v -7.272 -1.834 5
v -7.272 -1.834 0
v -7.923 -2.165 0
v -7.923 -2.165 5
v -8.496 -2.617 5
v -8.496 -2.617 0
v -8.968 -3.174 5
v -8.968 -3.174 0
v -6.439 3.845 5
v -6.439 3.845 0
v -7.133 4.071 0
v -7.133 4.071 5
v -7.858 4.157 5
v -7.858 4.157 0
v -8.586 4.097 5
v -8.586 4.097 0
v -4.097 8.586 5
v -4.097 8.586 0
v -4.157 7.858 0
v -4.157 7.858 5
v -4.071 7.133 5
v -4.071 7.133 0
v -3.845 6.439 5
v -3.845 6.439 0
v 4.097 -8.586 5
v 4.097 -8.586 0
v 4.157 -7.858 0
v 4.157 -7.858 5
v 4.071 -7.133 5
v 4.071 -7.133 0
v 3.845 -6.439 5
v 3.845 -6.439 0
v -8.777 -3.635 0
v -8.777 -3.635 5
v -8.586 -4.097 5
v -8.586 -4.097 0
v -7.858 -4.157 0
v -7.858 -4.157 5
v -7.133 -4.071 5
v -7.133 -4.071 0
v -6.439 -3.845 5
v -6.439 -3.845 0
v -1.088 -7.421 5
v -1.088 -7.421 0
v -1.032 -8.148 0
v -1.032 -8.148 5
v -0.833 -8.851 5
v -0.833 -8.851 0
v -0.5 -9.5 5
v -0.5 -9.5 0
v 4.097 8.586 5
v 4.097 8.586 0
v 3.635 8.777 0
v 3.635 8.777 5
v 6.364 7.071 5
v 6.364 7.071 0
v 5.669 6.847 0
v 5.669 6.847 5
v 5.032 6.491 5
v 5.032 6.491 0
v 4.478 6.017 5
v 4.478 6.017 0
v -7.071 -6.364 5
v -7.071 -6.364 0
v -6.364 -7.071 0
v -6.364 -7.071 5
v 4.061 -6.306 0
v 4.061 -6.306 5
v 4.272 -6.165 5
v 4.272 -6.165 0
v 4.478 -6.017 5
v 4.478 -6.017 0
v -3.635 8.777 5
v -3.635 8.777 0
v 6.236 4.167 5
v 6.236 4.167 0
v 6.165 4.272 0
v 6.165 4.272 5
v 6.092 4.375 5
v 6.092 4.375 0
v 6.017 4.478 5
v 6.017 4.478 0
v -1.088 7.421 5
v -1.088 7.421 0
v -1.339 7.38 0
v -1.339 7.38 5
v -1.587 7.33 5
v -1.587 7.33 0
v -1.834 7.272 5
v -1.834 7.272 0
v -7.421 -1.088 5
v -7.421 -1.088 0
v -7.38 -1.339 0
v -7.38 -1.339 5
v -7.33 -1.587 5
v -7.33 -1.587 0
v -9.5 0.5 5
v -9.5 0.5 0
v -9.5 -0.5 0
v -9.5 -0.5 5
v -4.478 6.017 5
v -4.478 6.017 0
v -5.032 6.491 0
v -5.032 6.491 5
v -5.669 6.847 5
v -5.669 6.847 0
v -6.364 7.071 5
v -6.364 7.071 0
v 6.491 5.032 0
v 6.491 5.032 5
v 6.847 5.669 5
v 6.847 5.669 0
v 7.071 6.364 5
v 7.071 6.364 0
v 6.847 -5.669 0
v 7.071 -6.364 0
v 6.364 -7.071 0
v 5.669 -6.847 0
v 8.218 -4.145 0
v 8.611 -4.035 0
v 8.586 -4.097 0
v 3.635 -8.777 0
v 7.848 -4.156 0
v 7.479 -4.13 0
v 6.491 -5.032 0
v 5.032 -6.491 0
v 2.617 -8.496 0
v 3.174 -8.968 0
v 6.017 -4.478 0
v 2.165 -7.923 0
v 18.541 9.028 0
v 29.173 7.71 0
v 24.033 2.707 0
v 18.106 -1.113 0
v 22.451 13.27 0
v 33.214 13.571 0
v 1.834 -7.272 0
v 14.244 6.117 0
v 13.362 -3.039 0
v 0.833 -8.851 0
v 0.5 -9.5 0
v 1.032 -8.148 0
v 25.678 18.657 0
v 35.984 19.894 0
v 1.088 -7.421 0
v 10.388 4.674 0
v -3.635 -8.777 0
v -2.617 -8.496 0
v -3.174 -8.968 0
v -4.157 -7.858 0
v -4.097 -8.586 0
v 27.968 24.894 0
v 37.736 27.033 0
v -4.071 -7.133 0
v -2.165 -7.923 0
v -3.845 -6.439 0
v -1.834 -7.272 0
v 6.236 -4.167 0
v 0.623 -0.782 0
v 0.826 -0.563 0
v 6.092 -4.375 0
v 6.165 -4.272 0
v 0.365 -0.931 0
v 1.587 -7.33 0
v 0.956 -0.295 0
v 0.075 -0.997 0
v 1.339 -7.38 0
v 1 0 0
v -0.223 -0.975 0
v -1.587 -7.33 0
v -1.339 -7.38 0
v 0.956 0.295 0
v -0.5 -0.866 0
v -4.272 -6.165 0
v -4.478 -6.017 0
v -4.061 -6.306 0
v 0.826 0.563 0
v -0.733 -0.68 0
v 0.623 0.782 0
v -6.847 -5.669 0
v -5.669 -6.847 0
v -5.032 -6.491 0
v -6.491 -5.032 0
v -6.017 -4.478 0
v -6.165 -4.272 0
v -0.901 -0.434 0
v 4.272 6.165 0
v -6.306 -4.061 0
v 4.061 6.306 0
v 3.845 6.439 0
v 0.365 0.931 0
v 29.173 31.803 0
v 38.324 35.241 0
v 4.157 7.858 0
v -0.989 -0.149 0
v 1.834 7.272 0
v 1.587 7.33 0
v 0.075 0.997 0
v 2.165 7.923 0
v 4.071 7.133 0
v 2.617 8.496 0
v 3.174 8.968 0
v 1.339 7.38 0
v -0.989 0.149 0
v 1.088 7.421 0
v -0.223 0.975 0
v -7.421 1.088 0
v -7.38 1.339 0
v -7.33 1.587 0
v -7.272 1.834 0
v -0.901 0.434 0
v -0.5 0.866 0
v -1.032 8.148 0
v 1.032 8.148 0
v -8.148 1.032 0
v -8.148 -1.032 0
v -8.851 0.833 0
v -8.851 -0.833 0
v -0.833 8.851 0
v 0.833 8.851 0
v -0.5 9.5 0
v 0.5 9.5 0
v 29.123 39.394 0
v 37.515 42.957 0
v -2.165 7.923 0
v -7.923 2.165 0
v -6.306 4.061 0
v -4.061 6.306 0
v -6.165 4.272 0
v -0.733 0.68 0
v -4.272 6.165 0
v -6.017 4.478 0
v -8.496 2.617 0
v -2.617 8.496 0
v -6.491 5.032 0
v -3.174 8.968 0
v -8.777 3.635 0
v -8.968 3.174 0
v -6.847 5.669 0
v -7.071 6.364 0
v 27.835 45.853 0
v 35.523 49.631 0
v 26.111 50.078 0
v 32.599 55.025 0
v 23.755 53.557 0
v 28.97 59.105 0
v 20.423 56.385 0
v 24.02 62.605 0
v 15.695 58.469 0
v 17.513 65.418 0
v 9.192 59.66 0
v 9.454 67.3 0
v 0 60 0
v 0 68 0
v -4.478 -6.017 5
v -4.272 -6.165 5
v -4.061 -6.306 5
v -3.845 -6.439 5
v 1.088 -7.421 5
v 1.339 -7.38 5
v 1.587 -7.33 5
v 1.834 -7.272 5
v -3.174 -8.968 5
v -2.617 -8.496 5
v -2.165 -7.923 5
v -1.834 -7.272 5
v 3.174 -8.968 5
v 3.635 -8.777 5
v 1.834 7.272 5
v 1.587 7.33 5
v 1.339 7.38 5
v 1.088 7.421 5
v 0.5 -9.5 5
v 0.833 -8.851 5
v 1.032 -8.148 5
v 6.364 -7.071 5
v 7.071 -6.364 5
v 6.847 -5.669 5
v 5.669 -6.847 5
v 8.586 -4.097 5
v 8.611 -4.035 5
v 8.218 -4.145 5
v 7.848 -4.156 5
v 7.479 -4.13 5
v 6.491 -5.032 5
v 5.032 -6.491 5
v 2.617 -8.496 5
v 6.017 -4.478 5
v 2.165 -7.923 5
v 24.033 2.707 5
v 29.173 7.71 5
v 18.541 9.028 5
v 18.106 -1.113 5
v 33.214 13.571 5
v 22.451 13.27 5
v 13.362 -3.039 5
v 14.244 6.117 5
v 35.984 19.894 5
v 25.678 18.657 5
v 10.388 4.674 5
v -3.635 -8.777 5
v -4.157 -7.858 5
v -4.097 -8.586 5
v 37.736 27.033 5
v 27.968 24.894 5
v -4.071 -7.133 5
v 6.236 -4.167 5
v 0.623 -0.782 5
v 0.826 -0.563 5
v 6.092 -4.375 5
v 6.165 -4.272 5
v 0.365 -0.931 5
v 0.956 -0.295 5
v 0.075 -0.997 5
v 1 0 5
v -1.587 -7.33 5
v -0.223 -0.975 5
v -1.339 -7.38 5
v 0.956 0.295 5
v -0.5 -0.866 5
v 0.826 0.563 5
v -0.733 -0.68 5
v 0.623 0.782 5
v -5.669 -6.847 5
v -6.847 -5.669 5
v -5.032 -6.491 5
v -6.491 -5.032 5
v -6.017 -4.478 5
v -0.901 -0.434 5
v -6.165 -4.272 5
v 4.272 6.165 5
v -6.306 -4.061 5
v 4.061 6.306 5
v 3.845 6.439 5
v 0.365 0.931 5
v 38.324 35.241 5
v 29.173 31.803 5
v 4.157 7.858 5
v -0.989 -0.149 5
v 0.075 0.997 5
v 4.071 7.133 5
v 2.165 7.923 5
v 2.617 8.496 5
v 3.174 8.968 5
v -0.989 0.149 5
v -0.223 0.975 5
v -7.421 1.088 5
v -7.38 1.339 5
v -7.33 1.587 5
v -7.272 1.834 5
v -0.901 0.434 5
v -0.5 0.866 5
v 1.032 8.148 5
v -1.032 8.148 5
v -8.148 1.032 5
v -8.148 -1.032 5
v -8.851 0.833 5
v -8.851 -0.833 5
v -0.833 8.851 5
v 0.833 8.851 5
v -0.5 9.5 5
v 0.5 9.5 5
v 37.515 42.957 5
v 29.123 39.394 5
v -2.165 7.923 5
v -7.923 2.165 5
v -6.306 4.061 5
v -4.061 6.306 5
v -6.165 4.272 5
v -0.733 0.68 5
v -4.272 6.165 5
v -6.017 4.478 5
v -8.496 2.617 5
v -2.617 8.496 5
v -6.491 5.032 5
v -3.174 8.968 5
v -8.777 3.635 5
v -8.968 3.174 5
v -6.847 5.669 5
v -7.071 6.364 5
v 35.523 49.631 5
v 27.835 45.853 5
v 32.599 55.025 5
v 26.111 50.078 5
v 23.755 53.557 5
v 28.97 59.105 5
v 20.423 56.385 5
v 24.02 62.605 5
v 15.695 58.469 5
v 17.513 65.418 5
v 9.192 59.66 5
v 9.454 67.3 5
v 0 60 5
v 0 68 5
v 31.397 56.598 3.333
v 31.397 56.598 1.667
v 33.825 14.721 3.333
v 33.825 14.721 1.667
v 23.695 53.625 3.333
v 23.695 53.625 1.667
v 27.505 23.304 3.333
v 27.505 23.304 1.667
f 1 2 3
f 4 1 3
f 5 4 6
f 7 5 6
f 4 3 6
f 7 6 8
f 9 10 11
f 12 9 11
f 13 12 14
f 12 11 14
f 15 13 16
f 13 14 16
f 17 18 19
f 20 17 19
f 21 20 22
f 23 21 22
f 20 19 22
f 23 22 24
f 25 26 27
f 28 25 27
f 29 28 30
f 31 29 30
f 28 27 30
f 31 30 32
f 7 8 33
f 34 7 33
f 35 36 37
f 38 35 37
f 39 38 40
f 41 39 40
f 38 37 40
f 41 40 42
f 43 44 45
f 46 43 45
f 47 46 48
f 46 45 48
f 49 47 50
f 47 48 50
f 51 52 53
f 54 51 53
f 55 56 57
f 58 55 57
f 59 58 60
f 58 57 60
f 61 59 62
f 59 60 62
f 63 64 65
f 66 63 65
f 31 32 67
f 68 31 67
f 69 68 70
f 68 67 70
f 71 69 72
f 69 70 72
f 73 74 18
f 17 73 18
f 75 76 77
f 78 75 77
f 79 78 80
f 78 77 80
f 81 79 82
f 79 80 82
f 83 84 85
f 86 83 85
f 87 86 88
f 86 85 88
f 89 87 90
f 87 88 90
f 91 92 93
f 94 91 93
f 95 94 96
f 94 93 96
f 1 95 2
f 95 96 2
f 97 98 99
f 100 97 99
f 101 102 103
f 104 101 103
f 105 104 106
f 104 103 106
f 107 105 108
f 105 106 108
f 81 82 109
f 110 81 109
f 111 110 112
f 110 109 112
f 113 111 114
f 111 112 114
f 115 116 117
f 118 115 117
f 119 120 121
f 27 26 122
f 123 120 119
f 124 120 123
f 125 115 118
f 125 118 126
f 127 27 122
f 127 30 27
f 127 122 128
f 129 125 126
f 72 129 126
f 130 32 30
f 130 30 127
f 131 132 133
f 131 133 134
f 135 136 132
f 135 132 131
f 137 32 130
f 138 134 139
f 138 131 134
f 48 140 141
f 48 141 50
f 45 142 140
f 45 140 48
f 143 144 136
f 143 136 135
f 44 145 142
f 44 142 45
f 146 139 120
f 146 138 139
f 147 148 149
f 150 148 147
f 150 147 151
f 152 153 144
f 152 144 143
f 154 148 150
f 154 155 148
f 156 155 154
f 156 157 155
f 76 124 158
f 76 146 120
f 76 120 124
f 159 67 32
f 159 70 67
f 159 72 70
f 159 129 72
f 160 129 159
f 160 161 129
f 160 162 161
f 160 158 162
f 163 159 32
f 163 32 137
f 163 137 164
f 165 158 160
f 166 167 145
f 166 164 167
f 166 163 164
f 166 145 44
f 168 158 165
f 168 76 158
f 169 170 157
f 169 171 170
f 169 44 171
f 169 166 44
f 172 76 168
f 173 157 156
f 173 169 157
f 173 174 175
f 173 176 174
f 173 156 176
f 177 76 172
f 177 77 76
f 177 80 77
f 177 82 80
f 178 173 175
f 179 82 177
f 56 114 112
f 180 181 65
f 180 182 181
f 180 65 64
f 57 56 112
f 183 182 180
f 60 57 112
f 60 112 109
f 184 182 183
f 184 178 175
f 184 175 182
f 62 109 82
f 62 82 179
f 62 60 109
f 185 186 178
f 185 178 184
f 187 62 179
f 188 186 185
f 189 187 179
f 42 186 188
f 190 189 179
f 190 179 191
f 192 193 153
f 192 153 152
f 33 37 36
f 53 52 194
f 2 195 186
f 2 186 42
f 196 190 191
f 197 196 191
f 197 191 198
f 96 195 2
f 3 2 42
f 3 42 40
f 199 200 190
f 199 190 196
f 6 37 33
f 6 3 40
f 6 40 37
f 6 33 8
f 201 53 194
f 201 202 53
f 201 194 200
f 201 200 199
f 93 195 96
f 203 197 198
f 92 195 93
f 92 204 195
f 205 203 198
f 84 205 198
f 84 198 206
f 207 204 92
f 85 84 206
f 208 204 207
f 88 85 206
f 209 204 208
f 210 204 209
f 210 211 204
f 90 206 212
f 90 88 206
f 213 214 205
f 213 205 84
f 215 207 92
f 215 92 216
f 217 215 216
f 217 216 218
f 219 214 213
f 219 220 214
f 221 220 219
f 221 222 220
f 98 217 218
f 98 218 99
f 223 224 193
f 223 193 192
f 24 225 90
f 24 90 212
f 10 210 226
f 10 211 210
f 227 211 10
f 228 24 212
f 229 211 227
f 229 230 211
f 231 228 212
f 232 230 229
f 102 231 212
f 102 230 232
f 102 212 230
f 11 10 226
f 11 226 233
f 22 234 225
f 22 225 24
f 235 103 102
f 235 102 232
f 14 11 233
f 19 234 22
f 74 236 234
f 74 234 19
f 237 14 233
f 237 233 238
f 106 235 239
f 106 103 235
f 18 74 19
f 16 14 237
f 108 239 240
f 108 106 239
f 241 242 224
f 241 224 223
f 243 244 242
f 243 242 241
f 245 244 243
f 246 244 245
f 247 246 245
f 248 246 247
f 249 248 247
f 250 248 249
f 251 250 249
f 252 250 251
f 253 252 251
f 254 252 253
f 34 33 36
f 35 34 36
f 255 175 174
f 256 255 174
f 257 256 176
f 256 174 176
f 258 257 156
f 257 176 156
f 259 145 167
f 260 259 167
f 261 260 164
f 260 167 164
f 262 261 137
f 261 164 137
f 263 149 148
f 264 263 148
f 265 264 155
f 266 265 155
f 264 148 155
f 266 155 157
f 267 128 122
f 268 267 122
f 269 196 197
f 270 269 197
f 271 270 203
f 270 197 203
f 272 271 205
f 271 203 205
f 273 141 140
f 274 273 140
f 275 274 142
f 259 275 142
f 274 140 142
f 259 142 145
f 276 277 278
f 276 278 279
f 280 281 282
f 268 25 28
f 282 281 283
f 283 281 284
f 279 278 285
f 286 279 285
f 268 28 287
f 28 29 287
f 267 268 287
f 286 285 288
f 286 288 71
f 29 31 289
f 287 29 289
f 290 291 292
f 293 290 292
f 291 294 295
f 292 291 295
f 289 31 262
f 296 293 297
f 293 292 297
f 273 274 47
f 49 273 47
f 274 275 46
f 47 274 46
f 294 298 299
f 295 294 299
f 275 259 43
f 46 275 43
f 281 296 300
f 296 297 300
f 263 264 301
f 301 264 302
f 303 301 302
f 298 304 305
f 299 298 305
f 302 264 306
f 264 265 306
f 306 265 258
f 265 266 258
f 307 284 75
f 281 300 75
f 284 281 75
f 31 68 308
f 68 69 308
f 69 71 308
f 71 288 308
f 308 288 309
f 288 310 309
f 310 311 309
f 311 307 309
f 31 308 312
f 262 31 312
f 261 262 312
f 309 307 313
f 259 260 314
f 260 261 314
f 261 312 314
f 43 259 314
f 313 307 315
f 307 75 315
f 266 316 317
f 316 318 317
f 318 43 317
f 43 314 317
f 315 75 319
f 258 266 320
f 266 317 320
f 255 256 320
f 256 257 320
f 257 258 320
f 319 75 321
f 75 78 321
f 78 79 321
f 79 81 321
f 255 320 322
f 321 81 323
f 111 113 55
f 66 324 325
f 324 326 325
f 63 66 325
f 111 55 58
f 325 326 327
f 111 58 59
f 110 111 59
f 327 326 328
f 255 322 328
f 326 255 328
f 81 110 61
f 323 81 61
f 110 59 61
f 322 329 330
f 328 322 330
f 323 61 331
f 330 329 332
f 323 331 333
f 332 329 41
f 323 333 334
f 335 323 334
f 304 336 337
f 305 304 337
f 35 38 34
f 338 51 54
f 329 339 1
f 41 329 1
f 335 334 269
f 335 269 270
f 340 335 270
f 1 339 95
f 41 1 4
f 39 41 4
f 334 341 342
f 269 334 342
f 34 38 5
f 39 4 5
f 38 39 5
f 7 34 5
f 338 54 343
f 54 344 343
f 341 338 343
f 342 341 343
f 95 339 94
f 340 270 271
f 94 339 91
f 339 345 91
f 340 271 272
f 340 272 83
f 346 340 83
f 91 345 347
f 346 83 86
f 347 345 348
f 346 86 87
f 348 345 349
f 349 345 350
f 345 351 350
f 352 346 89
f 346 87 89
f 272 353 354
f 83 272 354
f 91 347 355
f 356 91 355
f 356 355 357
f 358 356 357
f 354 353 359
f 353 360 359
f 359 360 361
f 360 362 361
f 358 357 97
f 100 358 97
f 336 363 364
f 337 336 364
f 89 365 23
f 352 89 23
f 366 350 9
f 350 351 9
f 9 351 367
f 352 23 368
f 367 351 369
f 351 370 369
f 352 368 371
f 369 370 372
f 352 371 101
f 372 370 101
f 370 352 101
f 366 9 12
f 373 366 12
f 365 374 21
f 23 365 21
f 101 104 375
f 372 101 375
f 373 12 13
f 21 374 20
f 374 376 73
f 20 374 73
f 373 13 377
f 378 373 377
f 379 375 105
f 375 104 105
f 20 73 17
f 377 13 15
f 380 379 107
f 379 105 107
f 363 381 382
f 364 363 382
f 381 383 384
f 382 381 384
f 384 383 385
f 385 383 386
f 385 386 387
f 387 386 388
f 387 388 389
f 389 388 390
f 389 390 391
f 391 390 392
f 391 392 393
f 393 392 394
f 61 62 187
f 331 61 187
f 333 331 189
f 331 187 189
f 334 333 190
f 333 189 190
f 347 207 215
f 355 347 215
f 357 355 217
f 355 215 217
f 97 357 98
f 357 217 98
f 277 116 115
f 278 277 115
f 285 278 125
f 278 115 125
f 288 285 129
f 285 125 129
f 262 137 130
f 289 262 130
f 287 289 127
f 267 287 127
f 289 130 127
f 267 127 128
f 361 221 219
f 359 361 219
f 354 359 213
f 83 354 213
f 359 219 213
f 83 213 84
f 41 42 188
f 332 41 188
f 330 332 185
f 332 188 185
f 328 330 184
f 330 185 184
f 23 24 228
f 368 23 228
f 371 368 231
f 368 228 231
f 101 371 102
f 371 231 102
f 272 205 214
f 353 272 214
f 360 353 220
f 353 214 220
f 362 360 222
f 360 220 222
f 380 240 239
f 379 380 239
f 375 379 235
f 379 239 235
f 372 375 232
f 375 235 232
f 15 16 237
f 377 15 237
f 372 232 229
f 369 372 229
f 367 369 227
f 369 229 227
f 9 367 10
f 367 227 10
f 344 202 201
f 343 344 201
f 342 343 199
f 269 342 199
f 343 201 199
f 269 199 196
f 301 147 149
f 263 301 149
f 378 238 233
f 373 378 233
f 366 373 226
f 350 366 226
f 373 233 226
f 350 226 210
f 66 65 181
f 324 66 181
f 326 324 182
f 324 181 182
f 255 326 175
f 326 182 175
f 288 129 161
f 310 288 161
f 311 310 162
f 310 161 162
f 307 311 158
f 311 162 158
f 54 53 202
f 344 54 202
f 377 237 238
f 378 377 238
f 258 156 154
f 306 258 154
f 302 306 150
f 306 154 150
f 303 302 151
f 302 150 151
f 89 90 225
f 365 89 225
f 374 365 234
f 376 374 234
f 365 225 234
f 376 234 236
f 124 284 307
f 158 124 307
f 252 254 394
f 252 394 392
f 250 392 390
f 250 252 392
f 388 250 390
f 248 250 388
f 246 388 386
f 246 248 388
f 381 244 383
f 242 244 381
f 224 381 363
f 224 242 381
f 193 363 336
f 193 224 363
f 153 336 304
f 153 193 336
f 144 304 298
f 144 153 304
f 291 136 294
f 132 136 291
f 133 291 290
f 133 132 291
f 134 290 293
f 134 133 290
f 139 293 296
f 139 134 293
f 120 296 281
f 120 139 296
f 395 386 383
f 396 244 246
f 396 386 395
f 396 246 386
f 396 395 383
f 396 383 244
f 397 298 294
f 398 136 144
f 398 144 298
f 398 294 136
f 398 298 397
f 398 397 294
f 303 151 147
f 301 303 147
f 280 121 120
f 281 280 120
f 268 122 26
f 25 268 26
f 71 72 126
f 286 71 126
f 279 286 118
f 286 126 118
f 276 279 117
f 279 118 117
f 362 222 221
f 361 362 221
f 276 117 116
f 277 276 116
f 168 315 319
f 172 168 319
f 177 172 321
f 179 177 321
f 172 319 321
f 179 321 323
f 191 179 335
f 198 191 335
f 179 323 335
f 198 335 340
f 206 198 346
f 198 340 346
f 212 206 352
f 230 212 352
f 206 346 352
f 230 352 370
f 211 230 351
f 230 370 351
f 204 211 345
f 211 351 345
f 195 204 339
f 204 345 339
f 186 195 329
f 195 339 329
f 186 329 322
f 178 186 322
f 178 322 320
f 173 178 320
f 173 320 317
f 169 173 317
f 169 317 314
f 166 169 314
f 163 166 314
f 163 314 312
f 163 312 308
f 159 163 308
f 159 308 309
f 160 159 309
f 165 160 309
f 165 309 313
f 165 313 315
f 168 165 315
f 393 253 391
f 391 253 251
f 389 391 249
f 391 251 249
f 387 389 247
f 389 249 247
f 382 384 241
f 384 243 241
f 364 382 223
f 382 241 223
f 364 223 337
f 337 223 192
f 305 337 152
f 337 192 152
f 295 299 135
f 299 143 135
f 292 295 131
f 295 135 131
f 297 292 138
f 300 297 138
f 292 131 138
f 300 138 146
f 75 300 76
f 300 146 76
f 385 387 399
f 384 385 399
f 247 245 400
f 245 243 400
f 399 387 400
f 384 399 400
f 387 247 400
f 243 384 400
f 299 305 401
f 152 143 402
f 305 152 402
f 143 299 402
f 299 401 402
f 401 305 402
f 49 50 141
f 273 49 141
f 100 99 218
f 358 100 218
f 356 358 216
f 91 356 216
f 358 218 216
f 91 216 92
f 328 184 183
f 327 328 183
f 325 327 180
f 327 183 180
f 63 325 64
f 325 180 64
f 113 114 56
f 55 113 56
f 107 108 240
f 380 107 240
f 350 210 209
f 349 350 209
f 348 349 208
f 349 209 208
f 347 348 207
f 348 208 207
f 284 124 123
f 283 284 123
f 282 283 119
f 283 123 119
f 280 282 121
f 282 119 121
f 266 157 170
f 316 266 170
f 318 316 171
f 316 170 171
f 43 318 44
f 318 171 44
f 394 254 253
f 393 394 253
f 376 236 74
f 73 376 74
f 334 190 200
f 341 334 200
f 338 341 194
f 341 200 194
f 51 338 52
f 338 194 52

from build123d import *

# Parameters (mm, degrees)
F1_DEPTH = 5
F2_R     = 1
F3_DEPTH = 5.001
F5_DEPTH = 5


with BuildPart() as f1:
    # F0 (on Top) → F1 (new body)
    with BuildSketch(Plane.XY):
        with BuildLine():
            ThreePointArc((7.4206173165, -1.0883191822), (7.4801280027, -0.5456052265), (7.5, 0))
            ThreePointArc((7.5, 0), (7.4801280027, 0.5456052265), (7.4206173165, 1.0883191822))
            ThreePointArc((7.4206173165, 1.0883191822), (7.355889603, 1.4631774151), (7.2722381774, 1.8342714877))
            ThreePointArc((7.2722381774, 1.8342714877), (6.9290964938, 2.8701257427), (6.4392747372, 3.8452231222))
            ThreePointArc((6.4392747372, 3.8452231222), (6.2360220923, 4.1667767476), (6.0167266989, 4.4776109513))
            ThreePointArc((6.0167266989, 4.4776109513), (5.3033008589, 5.3033008589), (4.4776109513, 6.0167266989))
            ThreePointArc((4.4776109513, 6.0167266989), (4.1667767476, 6.2360220923), (3.8452231222, 6.4392747372))
            ThreePointArc((3.8452231222, 6.4392747372), (2.8701257427, 6.9290964938), (1.8342714877, 7.2722381774))
            ThreePointArc((1.8342714877, 7.2722381774), (1.4631774151, 7.355889603), (1.0883191822, 7.4206173165))
            ThreePointArc((1.0883191822, 7.4206173165), (0, 7.5), (-1.0883191822, 7.4206173165))
            ThreePointArc((-1.0883191822, 7.4206173165), (-1.4631774151, 7.355889603), (-1.8342714877, 7.2722381774))
            ThreePointArc((-1.8342714877, 7.2722381774), (-2.8701257427, 6.9290964938), (-3.8452231222, 6.4392747372))
            ThreePointArc((-3.8452231222, 6.4392747372), (-4.1667767476, 6.2360220923), (-4.4776109513, 6.0167266989))
            ThreePointArc((-4.4776109513, 6.0167266989), (-5.3033008589, 5.3033008589), (-6.0167266989, 4.4776109513))
            ThreePointArc((-6.0167266989, 4.4776109513), (-6.2360220923, 4.1667767476), (-6.4392747372, 3.8452231222))
            ThreePointArc((-6.4392747372, 3.8452231222), (-6.9290964938, 2.8701257427), (-7.2722381774, 1.8342714877))
            ThreePointArc((-7.2722381774, 1.8342714877), (-7.355889603, 1.4631774151), (-7.4206173165, 1.0883191822))
            ThreePointArc((-7.4206173165, 1.0883191822), (-7.5, 0), (-7.4206173165, -1.0883191822))
            ThreePointArc((-7.4206173165, -1.0883191822), (-7.355889603, -1.4631774151), (-7.2722381774, -1.8342714877))
            ThreePointArc((-7.2722381774, -1.8342714877), (-6.9290964938, -2.8701257427), (-6.4392747372, -3.8452231222))
            ThreePointArc((-6.4392747372, -3.8452231222), (-6.2360220923, -4.1667767476), (-6.0167266989, -4.4776109513))
            ThreePointArc((-6.0167266989, -4.4776109513), (-5.3033008589, -5.3033008589), (-4.4776109513, -6.0167266989))
            ThreePointArc((-4.4776109513, -6.0167266989), (-4.1667767476, -6.2360220923), (-3.8452231222, -6.4392747372))
            ThreePointArc((-3.8452231222, -6.4392747372), (-2.8701257427, -6.9290964938), (-1.8342714877, -7.2722381774))
            ThreePointArc((-1.8342714877, -7.2722381774), (-1.4631774151, -7.355889603), (-1.0883191822, -7.4206173165))
            ThreePointArc((-1.0883191822, -7.4206173165), (0, -7.5), (1.0883191822, -7.4206173165))
            ThreePointArc((1.0883191822, -7.4206173165), (1.4631774151, -7.355889603), (1.8342714877, -7.2722381774))
            ThreePointArc((1.8342714877, -7.2722381774), (2.8701257427, -6.9290964938), (3.8452231222, -6.4392747372))
            ThreePointArc((3.8452231222, -6.4392747372), (4.1667767476, -6.2360220923), (4.4776109513, -6.0167266989))
            ThreePointArc((4.4776109513, -6.0167266989), (5.3033008589, -5.3033008589), (6.0167266989, -4.4776109513))
            ThreePointArc((6.0167266989, -4.4776109513), (6.2360220923, -4.1667767476), (6.4392747372, -3.8452231222))
            ThreePointArc((6.4392747372, -3.8452231222), (6.9290964938, -2.8701257427), (7.2722381774, -1.8342714877))
            ThreePointArc((7.2722381774, -1.8342714877), (7.355889603, -1.4631774151), (7.4206173165, -1.0883191822))
        make_face()
        with BuildLine():
            ThreePointArc((7.4206173165, 1.0883191822), (7.4801280027, 0.5456052265), (7.5, 0))
            ThreePointArc((7.5, 0), (7.4801280027, -0.5456052265), (7.4206173165, -1.0883191822))
            ThreePointArc((7.4206173165, -1.0883191822), (8.5043518229, -0.9498278009), (9.5, -0.5))
            Line((9.5, -0.5), (9.5, 0))
            Line((9.5, 0), (9.5, 0.5))
            ThreePointArc((9.5, 0.5), (8.5043518229, 0.9498278009), (7.4206173165, 1.0883191822))
        make_face()
        with BuildLine():
            ThreePointArc((6.4392747372, 3.8452231222), (6.9290964938, 2.8701257427), (7.2722381774, 1.8342714877))
            ThreePointArc((7.2722381774, 1.8342714877), (8.2204799494, 2.376948081), (8.968197275, 3.1735528412))
            Line((8.968197275, 3.1735528412), (8.7768555589, 3.6354926075))
            Line((8.7768555589, 3.6354926075), (8.5855138427, 4.0974323737))
            ThreePointArc((8.5855138427, 4.0974323737), (7.4935132234, 4.1320010103), (6.4392747372, 3.8452231222))
        make_face()
        with BuildLine():
            ThreePointArc((8.968197275, -3.1735528412), (8.2204799494, -2.376948081), (7.2722381774, -1.8342714877))
            ThreePointArc((7.2722381774, -1.8342714877), (6.9290964938, -2.8701257427), (6.4392747372, -3.8452231222))
            ThreePointArc((6.4392747372, -3.8452231222), (7.4935132234, -4.1320010103), (8.5855138427, -4.0974323737))
            Line((8.5855138427, -4.0974323737), (8.7768555589, -3.6354926075))
            Line((8.7768555589, -3.6354926075), (8.968197275, -3.1735528412))
        make_face()
        with BuildLine():
            ThreePointArc((4.4776109513, 6.0167266989), (5.3033008589, 5.3033008589), (6.0167266989, 4.4776109513))
            ThreePointArc((6.0167266989, 4.4776109513), (6.6851145225, 5.3418551646), (7.0710678119, 6.3639610307))
            Line((7.0710678119, 6.3639610307), (6.7175144213, 6.7175144213))
            Line((6.7175144213, 6.7175144213), (6.3639610307, 7.0710678119))
            ThreePointArc((6.3639610307, 7.0710678119), (5.3418551646, 6.6851145225), (4.4776109513, 6.0167266989))
        make_face()
        with BuildLine():
            ThreePointArc((7.0710678119, -6.3639610307), (6.6851145225, -5.3418551646), (6.0167266989, -4.4776109513))
            ThreePointArc((6.0167266989, -4.4776109513), (5.3033008589, -5.3033008589), (4.4776109513, -6.0167266989))
            ThreePointArc((4.4776109513, -6.0167266989), (5.3418551646, -6.6851145225), (6.3639610307, -7.0710678119))
            Line((6.3639610307, -7.0710678119), (6.7175144213, -6.7175144213))
            Line((6.7175144213, -6.7175144213), (7.0710678119, -6.3639610307))
        make_face()
        with BuildLine():
            ThreePointArc((1.8342714877, 7.2722381774), (2.8701257427, 6.9290964938), (3.8452231222, 6.4392747372))
            ThreePointArc((3.8452231222, 6.4392747372), (4.1320010103, 7.4935132234), (4.0974323737, 8.5855138427))
            Line((4.0974323737, 8.5855138427), (3.6354926075, 8.7768555589))
            Line((3.6354926075, 8.7768555589), (3.1735528412, 8.968197275))
            ThreePointArc((3.1735528412, 8.968197275), (2.376948081, 8.2204799494), (1.8342714877, 7.2722381774))
        make_face()
        with BuildLine():
            ThreePointArc((4.0974323737, -8.5855138427), (4.1320010103, -7.4935132234), (3.8452231222, -6.4392747372))
            ThreePointArc((3.8452231222, -6.4392747372), (2.8701257427, -6.9290964938), (1.8342714877, -7.2722381774))
            ThreePointArc((1.8342714877, -7.2722381774), (2.376948081, -8.2204799494), (3.1735528412, -8.968197275))
            Line((3.1735528412, -8.968197275), (3.6354926075, -8.7768555589))
            Line((3.6354926075, -8.7768555589), (4.0974323737, -8.5855138427))
        make_face()
        with BuildLine():
            ThreePointArc((-1.0883191822, 7.4206173165), (0, 7.5), (1.0883191822, 7.4206173165))
            ThreePointArc((1.0883191822, 7.4206173165), (0.9498278009, 8.5043518229), (0.5, 9.5))
            Line((0.5, 9.5), (0, 9.5))
            Line((0, 9.5), (-0.5, 9.5))
            ThreePointArc((-0.5, 9.5), (-0.9498278009, 8.5043518229), (-1.0883191822, 7.4206173165))
        make_face()
        with BuildLine():
            ThreePointArc((0.5, -9.5), (0.9498278009, -8.5043518229), (1.0883191822, -7.4206173165))
            ThreePointArc((1.0883191822, -7.4206173165), (0, -7.5), (-1.0883191822, -7.4206173165))
            ThreePointArc((-1.0883191822, -7.4206173165), (-0.9498278009, -8.5043518229), (-0.5, -9.5))
            Line((-0.5, -9.5), (0, -9.5))
            Line((0, -9.5), (0.5, -9.5))
        make_face()
        with BuildLine():
            ThreePointArc((-3.8452231222, 6.4392747372), (-2.8701257427, 6.9290964938), (-1.8342714877, 7.2722381774))
            ThreePointArc((-1.8342714877, 7.2722381774), (-2.376948081, 8.2204799494), (-3.1735528412, 8.968197275))
            Line((-3.1735528412, 8.968197275), (-3.6354926075, 8.7768555589))
            Line((-3.6354926075, 8.7768555589), (-4.0974323737, 8.5855138427))
            ThreePointArc((-4.0974323737, 8.5855138427), (-4.1320010103, 7.4935132234), (-3.8452231222, 6.4392747372))
        make_face()
        with BuildLine():
            ThreePointArc((-3.1735528412, -8.968197275), (-2.376948081, -8.2204799494), (-1.8342714877, -7.2722381774))
            ThreePointArc((-1.8342714877, -7.2722381774), (-2.8701257427, -6.9290964938), (-3.8452231222, -6.4392747372))
            ThreePointArc((-3.8452231222, -6.4392747372), (-4.1320010103, -7.4935132234), (-4.0974323737, -8.5855138427))
            Line((-4.0974323737, -8.5855138427), (-3.6354926075, -8.7768555589))
            Line((-3.6354926075, -8.7768555589), (-3.1735528412, -8.968197275))
        make_face()
        with BuildLine():
            ThreePointArc((-6.0167266989, 4.4776109513), (-5.3033008589, 5.3033008589), (-4.4776109513, 6.0167266989))
            ThreePointArc((-4.4776109513, 6.0167266989), (-5.3418551646, 6.6851145225), (-6.3639610307, 7.0710678119))
            Line((-6.3639610307, 7.0710678119), (-6.7175144213, 6.7175144213))
            Line((-6.7175144213, 6.7175144213), (-7.0710678119, 6.3639610307))
            ThreePointArc((-7.0710678119, 6.3639610307), (-6.6851145225, 5.3418551646), (-6.0167266989, 4.4776109513))
        make_face()
        with BuildLine():
            ThreePointArc((-6.3639610307, -7.0710678119), (-5.3418551646, -6.6851145225), (-4.4776109513, -6.0167266989))
            ThreePointArc((-4.4776109513, -6.0167266989), (-5.3033008589, -5.3033008589), (-6.0167266989, -4.4776109513))
            ThreePointArc((-6.0167266989, -4.4776109513), (-6.6851145225, -5.3418551646), (-7.0710678119, -6.3639610307))
            Line((-7.0710678119, -6.3639610307), (-6.7175144213, -6.7175144213))
            Line((-6.7175144213, -6.7175144213), (-6.3639610307, -7.0710678119))
        make_face()
        with BuildLine():
            ThreePointArc((-7.2722381774, 1.8342714877), (-6.9290964938, 2.8701257427), (-6.4392747372, 3.8452231222))
            ThreePointArc((-6.4392747372, 3.8452231222), (-7.4935132234, 4.1320010103), (-8.5855138427, 4.0974323737))
            Line((-8.5855138427, 4.0974323737), (-8.7768555589, 3.6354926075))
            Line((-8.7768555589, 3.6354926075), (-8.968197275, 3.1735528412))
            ThreePointArc((-8.968197275, 3.1735528412), (-8.2204799494, 2.376948081), (-7.2722381774, 1.8342714877))
        make_face()
        with BuildLine():
            ThreePointArc((-8.5855138427, -4.0974323737), (-7.4935132234, -4.1320010103), (-6.4392747372, -3.8452231222))
            ThreePointArc((-6.4392747372, -3.8452231222), (-6.9290964938, -2.8701257427), (-7.2722381774, -1.8342714877))
            ThreePointArc((-7.2722381774, -1.8342714877), (-8.2204799494, -2.376948081), (-8.968197275, -3.1735528412))
            Line((-8.968197275, -3.1735528412), (-8.7768555589, -3.6354926075))
            Line((-8.7768555589, -3.6354926075), (-8.5855138427, -4.0974323737))
        make_face()
        with BuildLine():
            ThreePointArc((-7.4206173165, -1.0883191822), (-7.5, 0), (-7.4206173165, 1.0883191822))
            ThreePointArc((-7.4206173165, 1.0883191822), (-8.5043518229, 0.9498278009), (-9.5, 0.5))
            Line((-9.5, 0.5), (-9.5, 0))
            Line((-9.5, 0), (-9.5, -0.5))
            ThreePointArc((-9.5, -0.5), (-8.5043518229, -0.9498278009), (-7.4206173165, -1.0883191822))
        make_face()
    extrude(amount=F1_DEPTH)

    # F2 (on face) → F3 (cut, through all)
    with BuildSketch(Plane.XY.offset(5)):
        Circle(F2_R)
    extrude(amount=-F3_DEPTH, mode=Mode.SUBTRACT)

    # F4 (on Top) → F5 (join, through all)
    with BuildSketch(Plane.XY):
        with BuildLine():
            add(Edge.make_bspline(
                [(0, 68), (10, 68), (39.3456439437, 63.064218154), (40.9770665239, 11.1452711637), (16.2360220923, -4.1667767476), (6.2360220923, -4.1667767476)],
                knots=[0, 0, 0, 0, 0.3204025883, 0.6794477725, 1, 1, 1, 1], degree=3))
            Line((0, 68), (0, 60))
            add(Edge.make_bspline(
                [(0, 60), (10, 60), (28.0903463875, 58.7730295468), (32.3932406636, 21.6529907107), (16.2360220923, 4.1667767476), (6.2360220923, 4.1667767476)],
                knots=[0, 0, 0, 0, 0.3129092193, 0.6621110471, 1, 1, 1, 1], degree=3))
            Line((6.2360220923, 4.1667767476), (6.2360220923, -4.1667767476))
        make_face()
    extrude(amount=F5_DEPTH)


solid = f1.part
